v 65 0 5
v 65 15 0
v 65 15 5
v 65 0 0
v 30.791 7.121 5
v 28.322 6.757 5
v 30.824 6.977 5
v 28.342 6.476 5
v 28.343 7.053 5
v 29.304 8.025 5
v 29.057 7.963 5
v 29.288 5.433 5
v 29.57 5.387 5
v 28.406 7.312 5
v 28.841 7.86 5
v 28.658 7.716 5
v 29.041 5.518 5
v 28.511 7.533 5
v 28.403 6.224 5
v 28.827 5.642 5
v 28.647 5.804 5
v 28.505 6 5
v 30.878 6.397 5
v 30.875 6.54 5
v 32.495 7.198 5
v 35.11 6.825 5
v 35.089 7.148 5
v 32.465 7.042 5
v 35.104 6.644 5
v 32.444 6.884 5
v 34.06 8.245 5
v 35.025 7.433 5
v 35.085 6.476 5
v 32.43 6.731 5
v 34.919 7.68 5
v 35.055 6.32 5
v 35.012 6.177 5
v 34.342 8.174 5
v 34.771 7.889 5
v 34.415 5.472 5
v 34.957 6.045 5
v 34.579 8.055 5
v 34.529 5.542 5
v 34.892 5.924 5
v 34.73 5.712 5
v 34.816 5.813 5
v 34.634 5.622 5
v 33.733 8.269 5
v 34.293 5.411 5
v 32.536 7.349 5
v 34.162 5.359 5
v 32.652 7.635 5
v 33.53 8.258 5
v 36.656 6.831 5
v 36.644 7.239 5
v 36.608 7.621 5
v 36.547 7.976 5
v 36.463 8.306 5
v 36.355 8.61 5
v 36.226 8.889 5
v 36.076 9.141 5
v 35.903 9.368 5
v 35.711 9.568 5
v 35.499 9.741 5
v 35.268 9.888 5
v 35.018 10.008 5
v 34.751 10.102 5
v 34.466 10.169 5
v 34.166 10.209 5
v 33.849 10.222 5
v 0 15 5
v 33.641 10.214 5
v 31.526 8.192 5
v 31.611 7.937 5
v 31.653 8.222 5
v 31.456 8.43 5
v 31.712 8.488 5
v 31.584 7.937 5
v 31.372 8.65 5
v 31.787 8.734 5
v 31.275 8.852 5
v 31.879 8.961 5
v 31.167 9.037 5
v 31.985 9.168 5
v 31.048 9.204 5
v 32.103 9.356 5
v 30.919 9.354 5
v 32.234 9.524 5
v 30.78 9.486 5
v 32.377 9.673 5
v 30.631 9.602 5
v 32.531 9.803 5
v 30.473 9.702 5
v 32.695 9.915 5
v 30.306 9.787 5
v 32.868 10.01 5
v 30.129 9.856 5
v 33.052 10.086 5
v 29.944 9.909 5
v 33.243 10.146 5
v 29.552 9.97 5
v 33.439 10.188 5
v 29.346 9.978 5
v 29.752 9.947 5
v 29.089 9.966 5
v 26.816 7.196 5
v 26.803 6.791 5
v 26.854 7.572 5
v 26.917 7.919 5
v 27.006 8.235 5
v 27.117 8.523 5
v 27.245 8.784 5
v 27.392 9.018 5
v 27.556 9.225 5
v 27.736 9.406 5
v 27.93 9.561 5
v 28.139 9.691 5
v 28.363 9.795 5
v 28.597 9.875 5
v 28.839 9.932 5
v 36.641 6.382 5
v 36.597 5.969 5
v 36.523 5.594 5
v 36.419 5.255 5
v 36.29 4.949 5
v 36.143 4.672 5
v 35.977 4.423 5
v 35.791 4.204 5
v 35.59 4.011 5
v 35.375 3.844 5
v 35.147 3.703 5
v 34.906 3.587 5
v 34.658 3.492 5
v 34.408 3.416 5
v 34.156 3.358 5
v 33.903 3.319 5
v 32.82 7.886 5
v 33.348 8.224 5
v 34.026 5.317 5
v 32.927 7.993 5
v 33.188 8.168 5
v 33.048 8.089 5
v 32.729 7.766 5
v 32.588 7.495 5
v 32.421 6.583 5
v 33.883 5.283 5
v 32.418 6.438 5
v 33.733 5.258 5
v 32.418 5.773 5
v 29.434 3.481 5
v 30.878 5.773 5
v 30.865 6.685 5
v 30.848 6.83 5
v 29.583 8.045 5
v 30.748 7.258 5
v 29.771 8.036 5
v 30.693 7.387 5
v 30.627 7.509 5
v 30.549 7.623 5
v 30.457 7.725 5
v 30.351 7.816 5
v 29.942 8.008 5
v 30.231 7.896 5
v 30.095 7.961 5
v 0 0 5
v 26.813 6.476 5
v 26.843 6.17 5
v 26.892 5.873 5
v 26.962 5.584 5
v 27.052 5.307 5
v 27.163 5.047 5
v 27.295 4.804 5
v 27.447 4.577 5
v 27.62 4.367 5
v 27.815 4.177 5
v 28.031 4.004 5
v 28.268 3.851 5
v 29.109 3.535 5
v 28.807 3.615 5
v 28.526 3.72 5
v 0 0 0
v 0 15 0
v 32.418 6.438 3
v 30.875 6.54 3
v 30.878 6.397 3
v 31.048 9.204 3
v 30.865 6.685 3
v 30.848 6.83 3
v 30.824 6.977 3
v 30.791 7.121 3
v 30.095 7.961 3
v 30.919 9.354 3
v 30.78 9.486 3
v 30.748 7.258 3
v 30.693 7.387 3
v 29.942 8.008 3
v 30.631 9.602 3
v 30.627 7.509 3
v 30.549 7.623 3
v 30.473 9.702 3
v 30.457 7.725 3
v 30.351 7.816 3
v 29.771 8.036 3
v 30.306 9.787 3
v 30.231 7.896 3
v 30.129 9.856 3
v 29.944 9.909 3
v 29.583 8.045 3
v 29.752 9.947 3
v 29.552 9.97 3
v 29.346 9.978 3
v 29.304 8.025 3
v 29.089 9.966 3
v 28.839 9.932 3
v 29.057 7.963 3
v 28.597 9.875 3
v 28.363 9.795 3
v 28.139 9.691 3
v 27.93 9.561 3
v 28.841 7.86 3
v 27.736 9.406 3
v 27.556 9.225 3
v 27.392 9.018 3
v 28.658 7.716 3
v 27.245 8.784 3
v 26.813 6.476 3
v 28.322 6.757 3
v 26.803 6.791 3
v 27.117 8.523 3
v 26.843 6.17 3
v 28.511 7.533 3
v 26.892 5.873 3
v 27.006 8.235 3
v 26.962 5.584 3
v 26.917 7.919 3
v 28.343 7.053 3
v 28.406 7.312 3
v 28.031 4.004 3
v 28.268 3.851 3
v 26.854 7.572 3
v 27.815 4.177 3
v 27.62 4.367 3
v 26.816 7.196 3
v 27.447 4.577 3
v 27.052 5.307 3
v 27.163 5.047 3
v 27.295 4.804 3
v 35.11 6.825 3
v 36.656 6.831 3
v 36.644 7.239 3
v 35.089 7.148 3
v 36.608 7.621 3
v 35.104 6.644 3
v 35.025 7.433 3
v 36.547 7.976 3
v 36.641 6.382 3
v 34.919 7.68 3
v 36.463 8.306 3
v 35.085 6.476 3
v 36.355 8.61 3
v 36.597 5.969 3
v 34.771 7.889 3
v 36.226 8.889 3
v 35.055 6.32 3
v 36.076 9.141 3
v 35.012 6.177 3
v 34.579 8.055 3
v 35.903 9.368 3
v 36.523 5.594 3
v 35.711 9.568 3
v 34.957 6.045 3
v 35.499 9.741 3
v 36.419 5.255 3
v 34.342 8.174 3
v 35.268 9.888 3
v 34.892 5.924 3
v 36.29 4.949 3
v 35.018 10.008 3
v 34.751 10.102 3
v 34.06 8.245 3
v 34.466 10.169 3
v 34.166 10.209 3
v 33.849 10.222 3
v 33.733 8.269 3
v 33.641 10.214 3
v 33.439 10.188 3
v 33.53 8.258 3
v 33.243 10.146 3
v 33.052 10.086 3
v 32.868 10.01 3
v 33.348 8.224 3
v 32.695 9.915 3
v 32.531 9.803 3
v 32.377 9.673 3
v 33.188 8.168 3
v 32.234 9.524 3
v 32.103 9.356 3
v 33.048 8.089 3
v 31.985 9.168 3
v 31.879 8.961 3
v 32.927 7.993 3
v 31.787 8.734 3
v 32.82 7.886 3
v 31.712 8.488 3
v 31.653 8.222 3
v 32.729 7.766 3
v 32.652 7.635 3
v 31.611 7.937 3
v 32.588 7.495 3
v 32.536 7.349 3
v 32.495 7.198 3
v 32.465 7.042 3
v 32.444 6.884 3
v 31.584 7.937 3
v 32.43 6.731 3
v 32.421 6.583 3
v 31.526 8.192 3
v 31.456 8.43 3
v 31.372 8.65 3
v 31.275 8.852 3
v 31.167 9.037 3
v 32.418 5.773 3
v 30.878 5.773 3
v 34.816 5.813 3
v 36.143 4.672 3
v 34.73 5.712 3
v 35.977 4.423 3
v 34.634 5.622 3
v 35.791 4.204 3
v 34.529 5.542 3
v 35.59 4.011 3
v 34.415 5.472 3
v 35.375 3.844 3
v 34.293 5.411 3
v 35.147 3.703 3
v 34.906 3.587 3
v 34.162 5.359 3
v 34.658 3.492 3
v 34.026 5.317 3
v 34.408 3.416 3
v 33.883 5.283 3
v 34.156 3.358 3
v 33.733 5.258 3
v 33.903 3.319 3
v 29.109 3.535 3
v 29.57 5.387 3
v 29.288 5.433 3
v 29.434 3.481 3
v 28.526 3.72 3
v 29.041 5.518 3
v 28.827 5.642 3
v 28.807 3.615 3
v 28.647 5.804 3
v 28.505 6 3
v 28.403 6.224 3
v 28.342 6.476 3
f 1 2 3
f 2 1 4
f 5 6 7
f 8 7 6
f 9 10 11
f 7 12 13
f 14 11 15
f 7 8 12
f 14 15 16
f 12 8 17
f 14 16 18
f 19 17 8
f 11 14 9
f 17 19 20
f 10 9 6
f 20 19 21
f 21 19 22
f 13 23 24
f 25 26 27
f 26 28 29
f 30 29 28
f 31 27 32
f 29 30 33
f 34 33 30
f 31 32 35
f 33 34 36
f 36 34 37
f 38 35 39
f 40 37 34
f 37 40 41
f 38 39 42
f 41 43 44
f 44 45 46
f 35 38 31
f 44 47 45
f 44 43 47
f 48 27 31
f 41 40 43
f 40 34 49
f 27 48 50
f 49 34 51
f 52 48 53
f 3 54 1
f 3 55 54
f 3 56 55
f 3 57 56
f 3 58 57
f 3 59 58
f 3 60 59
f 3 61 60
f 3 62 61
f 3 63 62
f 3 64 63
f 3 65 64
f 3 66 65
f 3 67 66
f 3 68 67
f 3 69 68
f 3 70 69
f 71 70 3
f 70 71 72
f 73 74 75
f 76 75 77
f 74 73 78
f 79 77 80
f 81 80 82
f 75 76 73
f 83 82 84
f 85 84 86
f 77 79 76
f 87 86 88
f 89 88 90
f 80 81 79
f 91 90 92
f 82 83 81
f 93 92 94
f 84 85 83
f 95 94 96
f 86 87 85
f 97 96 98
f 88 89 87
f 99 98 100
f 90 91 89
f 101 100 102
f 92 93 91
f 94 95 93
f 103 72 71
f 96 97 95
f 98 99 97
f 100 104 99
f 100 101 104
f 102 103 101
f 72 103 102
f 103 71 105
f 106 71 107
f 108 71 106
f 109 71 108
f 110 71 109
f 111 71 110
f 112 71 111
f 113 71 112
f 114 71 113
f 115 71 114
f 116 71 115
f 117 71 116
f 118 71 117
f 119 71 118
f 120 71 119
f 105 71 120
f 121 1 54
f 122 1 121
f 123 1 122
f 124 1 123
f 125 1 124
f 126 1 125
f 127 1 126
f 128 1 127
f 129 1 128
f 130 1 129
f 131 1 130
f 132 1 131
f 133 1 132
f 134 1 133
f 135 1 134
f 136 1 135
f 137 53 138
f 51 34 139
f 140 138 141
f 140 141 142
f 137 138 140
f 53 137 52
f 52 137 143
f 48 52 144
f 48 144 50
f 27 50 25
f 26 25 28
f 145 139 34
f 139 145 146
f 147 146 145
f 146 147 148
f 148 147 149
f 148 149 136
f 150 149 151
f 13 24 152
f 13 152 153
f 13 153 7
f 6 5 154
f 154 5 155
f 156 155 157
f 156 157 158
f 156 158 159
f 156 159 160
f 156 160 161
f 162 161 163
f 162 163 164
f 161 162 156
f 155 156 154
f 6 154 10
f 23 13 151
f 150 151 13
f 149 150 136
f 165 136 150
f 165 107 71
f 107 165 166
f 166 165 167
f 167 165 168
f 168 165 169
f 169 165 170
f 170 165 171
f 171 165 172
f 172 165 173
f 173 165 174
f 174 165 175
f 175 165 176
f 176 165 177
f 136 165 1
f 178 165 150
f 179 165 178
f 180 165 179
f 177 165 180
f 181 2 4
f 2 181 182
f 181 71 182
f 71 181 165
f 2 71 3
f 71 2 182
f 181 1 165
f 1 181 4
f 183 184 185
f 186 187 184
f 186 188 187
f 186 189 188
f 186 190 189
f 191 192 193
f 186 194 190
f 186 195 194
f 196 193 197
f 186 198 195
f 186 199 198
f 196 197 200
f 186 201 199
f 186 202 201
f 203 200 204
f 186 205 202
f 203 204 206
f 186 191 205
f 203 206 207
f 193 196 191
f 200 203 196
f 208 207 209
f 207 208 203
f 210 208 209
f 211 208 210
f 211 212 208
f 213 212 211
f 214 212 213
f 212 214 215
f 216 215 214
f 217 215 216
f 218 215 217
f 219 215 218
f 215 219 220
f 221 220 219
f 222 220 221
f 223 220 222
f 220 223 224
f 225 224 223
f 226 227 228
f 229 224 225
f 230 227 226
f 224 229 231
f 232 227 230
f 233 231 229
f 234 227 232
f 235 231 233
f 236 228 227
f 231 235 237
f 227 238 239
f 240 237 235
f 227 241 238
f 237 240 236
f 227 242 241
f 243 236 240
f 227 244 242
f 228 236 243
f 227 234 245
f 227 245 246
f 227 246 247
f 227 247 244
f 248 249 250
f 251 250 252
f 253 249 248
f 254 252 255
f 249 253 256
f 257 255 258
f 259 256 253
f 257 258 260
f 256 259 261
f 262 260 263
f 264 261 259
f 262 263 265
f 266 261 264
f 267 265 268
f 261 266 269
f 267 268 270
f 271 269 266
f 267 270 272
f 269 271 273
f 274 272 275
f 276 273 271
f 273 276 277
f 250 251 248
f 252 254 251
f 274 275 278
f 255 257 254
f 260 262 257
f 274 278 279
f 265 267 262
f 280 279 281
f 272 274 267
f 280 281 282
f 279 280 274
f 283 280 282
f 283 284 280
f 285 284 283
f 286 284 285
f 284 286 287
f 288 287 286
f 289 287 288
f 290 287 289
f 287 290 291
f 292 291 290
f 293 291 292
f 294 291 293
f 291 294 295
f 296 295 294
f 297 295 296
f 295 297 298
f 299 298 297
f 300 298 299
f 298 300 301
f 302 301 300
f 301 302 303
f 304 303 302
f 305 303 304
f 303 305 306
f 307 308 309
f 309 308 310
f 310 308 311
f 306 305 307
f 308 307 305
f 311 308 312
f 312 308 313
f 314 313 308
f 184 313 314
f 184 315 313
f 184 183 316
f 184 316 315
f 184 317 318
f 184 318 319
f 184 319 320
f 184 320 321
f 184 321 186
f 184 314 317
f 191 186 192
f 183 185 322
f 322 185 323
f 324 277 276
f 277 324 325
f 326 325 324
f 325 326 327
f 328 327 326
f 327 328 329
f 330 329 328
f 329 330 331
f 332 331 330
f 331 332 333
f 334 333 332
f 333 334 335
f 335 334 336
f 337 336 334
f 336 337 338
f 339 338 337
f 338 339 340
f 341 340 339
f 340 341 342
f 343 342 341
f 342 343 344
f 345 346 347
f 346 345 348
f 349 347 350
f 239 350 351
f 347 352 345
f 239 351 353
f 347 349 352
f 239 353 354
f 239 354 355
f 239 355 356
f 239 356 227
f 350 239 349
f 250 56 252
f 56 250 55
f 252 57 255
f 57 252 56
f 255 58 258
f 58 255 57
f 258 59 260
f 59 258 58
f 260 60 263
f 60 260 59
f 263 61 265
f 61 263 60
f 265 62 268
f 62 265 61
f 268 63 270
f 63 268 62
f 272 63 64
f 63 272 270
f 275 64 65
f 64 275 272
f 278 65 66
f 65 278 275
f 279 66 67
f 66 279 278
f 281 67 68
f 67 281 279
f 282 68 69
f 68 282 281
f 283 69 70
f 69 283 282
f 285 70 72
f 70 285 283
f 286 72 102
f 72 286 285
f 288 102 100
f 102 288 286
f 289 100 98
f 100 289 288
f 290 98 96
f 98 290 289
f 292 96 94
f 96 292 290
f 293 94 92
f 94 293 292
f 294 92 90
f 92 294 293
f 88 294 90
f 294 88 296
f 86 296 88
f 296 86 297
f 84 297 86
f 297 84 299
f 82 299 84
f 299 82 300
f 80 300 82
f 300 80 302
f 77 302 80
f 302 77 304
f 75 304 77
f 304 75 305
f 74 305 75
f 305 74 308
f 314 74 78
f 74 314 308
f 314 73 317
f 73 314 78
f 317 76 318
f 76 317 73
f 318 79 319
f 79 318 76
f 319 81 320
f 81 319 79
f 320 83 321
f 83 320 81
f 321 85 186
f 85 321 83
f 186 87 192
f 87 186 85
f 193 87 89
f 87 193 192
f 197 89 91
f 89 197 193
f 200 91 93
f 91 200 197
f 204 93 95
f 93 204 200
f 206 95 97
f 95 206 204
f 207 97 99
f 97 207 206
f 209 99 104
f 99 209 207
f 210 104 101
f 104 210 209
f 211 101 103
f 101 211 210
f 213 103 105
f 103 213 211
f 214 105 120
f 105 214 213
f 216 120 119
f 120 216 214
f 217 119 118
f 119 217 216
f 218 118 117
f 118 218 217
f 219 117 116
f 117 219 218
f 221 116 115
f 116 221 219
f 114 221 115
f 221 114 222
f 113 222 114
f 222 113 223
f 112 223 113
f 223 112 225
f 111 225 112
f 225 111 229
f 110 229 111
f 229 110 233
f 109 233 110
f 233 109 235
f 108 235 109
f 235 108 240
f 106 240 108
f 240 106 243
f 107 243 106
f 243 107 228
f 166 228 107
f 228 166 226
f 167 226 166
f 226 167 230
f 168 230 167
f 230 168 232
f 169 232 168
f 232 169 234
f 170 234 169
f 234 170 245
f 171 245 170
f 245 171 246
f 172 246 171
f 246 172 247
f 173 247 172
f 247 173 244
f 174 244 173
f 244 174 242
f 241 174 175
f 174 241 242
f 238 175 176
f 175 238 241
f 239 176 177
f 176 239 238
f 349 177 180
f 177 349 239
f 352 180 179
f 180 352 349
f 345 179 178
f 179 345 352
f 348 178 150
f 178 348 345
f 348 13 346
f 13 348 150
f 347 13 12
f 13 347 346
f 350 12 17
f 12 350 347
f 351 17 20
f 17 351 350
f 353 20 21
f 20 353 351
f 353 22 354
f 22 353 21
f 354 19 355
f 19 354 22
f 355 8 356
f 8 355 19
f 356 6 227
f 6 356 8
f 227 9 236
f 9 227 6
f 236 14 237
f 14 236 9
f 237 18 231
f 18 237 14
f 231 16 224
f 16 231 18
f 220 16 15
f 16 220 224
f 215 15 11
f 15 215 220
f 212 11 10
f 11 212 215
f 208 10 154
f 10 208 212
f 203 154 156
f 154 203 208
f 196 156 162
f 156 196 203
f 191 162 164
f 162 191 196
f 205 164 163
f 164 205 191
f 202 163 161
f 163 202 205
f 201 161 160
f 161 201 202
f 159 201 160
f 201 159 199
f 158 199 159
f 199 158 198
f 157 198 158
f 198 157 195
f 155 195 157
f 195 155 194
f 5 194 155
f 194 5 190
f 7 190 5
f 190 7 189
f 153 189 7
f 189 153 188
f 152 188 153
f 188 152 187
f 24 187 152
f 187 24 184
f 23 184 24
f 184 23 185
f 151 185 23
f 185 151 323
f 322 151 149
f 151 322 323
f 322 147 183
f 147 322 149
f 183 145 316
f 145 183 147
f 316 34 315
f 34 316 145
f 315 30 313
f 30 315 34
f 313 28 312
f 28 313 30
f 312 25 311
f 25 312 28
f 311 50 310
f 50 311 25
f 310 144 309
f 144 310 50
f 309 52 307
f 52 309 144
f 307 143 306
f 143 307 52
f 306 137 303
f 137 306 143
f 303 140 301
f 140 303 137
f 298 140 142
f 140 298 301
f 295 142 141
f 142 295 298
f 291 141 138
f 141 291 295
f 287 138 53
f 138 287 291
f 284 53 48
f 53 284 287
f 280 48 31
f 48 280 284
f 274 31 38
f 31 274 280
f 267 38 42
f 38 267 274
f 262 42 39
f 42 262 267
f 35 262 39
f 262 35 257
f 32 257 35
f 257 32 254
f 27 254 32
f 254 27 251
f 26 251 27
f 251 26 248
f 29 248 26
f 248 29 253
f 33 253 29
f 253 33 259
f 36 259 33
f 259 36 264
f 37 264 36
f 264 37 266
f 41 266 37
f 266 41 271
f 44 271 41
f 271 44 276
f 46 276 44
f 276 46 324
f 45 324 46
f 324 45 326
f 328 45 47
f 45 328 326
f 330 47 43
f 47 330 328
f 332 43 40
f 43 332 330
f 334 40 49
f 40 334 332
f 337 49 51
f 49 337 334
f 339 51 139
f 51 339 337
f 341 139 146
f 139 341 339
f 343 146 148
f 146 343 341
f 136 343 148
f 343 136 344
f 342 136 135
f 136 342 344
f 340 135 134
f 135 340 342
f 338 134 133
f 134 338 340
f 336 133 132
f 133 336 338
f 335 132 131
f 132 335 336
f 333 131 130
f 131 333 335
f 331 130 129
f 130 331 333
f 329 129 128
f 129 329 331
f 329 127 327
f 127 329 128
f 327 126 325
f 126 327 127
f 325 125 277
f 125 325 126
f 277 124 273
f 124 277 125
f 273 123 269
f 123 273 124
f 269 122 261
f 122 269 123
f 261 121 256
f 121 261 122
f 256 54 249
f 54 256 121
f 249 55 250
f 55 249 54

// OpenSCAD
difference(){
	union(){ 
        translate([0,0,0]){
           cube([65,15,5], center=false);
        }                
	}
	union() {
        translate([60-65/2+9, 3,3]){
            linear_extrude(height = 10) {
                rotate([0,0,90]){
                    text("3", size = 10, font="Arial:style=Bold");
                }
            }
        }                


	}
}
